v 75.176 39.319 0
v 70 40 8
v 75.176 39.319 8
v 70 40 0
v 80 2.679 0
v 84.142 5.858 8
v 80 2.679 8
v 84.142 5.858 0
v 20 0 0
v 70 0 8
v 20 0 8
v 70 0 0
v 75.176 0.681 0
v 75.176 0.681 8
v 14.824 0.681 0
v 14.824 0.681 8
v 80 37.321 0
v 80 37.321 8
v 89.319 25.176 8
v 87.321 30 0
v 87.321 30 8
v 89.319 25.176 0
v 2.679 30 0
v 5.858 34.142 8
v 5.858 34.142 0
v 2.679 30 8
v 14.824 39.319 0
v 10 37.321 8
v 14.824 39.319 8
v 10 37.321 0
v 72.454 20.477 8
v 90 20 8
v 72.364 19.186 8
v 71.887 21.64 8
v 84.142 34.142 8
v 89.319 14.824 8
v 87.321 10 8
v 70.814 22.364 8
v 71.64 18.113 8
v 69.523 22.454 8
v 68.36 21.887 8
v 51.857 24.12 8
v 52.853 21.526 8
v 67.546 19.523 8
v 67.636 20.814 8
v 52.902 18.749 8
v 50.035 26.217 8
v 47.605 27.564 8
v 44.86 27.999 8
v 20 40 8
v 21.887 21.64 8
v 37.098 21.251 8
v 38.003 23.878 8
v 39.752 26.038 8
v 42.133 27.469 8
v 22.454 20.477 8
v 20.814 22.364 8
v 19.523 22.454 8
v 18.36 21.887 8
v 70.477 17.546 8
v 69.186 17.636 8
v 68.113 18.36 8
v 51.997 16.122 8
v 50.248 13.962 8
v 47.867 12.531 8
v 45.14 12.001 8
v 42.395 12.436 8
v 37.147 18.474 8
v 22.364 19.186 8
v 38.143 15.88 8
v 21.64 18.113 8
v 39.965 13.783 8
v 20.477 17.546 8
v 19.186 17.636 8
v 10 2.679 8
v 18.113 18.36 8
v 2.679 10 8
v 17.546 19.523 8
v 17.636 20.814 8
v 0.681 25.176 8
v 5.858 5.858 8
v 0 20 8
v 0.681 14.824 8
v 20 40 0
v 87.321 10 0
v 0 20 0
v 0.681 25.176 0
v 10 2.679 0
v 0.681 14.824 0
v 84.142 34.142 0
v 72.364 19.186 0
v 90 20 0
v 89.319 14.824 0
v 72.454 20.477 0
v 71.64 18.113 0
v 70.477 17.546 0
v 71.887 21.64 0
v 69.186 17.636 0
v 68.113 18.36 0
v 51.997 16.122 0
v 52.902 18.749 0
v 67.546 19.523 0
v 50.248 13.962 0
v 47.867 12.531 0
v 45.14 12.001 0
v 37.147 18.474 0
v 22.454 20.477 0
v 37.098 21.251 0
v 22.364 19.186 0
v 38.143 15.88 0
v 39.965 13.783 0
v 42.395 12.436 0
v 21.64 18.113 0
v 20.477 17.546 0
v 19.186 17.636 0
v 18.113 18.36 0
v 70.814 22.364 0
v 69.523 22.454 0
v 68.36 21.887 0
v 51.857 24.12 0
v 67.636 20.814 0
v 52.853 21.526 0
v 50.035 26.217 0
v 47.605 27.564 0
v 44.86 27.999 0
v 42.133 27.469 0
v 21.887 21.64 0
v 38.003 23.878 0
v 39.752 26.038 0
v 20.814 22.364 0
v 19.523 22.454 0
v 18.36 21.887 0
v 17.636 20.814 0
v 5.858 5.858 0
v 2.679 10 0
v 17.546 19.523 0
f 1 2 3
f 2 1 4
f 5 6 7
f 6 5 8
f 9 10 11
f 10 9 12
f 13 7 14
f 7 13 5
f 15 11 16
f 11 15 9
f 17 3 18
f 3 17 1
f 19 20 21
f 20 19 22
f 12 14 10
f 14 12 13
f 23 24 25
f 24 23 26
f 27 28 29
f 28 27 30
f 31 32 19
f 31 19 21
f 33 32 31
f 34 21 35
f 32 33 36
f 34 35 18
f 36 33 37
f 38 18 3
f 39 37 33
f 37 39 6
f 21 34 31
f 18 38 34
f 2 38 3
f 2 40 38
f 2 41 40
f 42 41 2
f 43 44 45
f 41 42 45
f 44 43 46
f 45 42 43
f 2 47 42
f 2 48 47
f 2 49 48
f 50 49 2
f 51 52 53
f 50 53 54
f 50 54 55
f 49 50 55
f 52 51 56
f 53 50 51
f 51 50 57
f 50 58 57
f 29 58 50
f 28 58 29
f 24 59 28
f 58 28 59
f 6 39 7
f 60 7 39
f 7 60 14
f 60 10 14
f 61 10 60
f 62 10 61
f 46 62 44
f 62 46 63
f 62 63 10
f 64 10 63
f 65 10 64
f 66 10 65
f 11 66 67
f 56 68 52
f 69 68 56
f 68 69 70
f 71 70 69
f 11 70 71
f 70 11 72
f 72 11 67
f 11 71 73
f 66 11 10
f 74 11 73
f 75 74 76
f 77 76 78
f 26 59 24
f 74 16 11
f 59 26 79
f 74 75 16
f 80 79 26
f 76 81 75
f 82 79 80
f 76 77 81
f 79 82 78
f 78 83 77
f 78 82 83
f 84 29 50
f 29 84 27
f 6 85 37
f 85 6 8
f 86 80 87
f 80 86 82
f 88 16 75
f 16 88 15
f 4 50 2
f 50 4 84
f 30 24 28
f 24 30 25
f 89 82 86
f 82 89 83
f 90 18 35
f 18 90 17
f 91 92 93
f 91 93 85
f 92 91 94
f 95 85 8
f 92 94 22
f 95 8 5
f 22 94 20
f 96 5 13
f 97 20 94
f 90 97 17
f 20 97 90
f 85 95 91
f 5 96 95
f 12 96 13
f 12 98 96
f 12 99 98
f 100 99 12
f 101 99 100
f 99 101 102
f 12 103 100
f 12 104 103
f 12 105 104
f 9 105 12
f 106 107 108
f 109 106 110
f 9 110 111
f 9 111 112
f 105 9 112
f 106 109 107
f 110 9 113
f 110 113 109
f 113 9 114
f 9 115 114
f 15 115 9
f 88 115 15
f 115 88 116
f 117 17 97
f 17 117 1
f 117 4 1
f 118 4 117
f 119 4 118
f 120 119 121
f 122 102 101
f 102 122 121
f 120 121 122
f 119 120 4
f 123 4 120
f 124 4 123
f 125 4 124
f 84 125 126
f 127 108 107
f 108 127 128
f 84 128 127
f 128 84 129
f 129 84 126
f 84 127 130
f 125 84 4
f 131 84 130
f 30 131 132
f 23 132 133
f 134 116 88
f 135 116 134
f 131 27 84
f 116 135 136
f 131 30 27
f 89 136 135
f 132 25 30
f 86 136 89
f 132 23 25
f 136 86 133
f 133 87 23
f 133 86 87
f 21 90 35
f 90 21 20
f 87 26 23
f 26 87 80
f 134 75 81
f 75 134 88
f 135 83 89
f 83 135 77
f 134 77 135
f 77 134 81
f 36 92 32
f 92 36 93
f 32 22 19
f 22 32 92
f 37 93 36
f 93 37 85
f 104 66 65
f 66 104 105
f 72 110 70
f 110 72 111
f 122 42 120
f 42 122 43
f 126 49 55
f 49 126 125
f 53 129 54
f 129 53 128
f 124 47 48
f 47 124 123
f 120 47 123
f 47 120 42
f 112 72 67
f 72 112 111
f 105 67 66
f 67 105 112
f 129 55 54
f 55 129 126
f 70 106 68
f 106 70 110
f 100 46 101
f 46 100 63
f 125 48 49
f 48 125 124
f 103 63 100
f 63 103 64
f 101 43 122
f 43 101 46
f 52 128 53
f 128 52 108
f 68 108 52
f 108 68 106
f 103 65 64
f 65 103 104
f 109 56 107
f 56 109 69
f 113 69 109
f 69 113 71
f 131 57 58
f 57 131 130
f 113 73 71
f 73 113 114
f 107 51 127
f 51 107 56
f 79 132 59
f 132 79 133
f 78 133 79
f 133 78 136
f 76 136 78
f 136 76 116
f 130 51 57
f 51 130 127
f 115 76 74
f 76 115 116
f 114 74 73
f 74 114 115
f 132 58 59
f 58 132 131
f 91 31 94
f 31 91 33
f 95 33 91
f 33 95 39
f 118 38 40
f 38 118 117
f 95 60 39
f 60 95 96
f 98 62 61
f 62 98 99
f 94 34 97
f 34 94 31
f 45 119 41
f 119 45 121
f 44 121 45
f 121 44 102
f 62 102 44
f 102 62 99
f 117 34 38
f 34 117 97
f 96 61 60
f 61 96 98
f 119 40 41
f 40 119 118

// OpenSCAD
$fn = 32;

// ----------------------------------------------------------------------
// Spacer plate: obround span 50, caps R20
// ----------------------------------------------------------------------

// --- parameters (mm) ---
bore_r = 8;               // centre bore radius
bolt_r = 2.5;             // bolt hole radius
plate_t = 8;              // plate thickness, Z (extrusion height)
span = 50;                // obround span
cap_r = 20;               // cap radius

profile = [[20, 40], [14.824, 39.319], [10, 37.321], [5.858, 34.142], [2.679, 30], [0.681, 25.176], [0, 20], [0.681, 14.824], [2.679, 10], [5.858, 5.858], [10, 2.679], [14.824, 0.681], [20, 0], [70, 0], [75.176, 0.681], [80, 2.679], [84.142, 5.858], [87.321, 10], [89.319, 14.824], [90, 20], [89.319, 25.176], [87.321, 30], [84.142, 34.142], [80, 37.321], [75.176, 39.319], [70, 40]];  // primary outline, 26 points, counter clockwise
void_1 = [[52.853, 21.526], [51.857, 24.12], [50.035, 26.217], [47.605, 27.564], [44.86, 27.999], [42.133, 27.469], [39.752, 26.038], [38.003, 23.878], [37.098, 21.251], [37.147, 18.474], [38.143, 15.88], [39.965, 13.783], [42.395, 12.436], [45.14, 12.001], [47.867, 12.531], [50.248, 13.962], [51.997, 16.122], [52.902, 18.749]];  // centre bore, 18 points
void_2 = [[22.454, 20.477], [21.887, 21.64], [20.814, 22.364], [19.523, 22.454], [18.36, 21.887], [17.636, 20.814], [17.546, 19.523], [18.113, 18.36], [19.186, 17.636], [20.477, 17.546], [21.64, 18.113], [22.364, 19.186]];  // end hole, 12 points
void_3 = [[72.454, 20.477], [71.887, 21.64], [70.814, 22.364], [69.523, 22.454], [68.36, 21.887], [67.636, 20.814], [67.546, 19.523], [68.113, 18.36], [69.186, 17.636], [70.477, 17.546], [71.64, 18.113], [72.364, 19.186]];  // end hole, 12 points

// --- the one profile operation ---
difference() {
  linear_extrude(height = plate_t) polygon(points = profile);
  translate([0, 0, -1])
    linear_extrude(height = plate_t + 2) polygon(points = void_1);
  translate([0, 0, -1])
    linear_extrude(height = plate_t + 2) polygon(points = void_2);
  translate([0, 0, -1])
    linear_extrude(height = plate_t + 2) polygon(points = void_3);
}
